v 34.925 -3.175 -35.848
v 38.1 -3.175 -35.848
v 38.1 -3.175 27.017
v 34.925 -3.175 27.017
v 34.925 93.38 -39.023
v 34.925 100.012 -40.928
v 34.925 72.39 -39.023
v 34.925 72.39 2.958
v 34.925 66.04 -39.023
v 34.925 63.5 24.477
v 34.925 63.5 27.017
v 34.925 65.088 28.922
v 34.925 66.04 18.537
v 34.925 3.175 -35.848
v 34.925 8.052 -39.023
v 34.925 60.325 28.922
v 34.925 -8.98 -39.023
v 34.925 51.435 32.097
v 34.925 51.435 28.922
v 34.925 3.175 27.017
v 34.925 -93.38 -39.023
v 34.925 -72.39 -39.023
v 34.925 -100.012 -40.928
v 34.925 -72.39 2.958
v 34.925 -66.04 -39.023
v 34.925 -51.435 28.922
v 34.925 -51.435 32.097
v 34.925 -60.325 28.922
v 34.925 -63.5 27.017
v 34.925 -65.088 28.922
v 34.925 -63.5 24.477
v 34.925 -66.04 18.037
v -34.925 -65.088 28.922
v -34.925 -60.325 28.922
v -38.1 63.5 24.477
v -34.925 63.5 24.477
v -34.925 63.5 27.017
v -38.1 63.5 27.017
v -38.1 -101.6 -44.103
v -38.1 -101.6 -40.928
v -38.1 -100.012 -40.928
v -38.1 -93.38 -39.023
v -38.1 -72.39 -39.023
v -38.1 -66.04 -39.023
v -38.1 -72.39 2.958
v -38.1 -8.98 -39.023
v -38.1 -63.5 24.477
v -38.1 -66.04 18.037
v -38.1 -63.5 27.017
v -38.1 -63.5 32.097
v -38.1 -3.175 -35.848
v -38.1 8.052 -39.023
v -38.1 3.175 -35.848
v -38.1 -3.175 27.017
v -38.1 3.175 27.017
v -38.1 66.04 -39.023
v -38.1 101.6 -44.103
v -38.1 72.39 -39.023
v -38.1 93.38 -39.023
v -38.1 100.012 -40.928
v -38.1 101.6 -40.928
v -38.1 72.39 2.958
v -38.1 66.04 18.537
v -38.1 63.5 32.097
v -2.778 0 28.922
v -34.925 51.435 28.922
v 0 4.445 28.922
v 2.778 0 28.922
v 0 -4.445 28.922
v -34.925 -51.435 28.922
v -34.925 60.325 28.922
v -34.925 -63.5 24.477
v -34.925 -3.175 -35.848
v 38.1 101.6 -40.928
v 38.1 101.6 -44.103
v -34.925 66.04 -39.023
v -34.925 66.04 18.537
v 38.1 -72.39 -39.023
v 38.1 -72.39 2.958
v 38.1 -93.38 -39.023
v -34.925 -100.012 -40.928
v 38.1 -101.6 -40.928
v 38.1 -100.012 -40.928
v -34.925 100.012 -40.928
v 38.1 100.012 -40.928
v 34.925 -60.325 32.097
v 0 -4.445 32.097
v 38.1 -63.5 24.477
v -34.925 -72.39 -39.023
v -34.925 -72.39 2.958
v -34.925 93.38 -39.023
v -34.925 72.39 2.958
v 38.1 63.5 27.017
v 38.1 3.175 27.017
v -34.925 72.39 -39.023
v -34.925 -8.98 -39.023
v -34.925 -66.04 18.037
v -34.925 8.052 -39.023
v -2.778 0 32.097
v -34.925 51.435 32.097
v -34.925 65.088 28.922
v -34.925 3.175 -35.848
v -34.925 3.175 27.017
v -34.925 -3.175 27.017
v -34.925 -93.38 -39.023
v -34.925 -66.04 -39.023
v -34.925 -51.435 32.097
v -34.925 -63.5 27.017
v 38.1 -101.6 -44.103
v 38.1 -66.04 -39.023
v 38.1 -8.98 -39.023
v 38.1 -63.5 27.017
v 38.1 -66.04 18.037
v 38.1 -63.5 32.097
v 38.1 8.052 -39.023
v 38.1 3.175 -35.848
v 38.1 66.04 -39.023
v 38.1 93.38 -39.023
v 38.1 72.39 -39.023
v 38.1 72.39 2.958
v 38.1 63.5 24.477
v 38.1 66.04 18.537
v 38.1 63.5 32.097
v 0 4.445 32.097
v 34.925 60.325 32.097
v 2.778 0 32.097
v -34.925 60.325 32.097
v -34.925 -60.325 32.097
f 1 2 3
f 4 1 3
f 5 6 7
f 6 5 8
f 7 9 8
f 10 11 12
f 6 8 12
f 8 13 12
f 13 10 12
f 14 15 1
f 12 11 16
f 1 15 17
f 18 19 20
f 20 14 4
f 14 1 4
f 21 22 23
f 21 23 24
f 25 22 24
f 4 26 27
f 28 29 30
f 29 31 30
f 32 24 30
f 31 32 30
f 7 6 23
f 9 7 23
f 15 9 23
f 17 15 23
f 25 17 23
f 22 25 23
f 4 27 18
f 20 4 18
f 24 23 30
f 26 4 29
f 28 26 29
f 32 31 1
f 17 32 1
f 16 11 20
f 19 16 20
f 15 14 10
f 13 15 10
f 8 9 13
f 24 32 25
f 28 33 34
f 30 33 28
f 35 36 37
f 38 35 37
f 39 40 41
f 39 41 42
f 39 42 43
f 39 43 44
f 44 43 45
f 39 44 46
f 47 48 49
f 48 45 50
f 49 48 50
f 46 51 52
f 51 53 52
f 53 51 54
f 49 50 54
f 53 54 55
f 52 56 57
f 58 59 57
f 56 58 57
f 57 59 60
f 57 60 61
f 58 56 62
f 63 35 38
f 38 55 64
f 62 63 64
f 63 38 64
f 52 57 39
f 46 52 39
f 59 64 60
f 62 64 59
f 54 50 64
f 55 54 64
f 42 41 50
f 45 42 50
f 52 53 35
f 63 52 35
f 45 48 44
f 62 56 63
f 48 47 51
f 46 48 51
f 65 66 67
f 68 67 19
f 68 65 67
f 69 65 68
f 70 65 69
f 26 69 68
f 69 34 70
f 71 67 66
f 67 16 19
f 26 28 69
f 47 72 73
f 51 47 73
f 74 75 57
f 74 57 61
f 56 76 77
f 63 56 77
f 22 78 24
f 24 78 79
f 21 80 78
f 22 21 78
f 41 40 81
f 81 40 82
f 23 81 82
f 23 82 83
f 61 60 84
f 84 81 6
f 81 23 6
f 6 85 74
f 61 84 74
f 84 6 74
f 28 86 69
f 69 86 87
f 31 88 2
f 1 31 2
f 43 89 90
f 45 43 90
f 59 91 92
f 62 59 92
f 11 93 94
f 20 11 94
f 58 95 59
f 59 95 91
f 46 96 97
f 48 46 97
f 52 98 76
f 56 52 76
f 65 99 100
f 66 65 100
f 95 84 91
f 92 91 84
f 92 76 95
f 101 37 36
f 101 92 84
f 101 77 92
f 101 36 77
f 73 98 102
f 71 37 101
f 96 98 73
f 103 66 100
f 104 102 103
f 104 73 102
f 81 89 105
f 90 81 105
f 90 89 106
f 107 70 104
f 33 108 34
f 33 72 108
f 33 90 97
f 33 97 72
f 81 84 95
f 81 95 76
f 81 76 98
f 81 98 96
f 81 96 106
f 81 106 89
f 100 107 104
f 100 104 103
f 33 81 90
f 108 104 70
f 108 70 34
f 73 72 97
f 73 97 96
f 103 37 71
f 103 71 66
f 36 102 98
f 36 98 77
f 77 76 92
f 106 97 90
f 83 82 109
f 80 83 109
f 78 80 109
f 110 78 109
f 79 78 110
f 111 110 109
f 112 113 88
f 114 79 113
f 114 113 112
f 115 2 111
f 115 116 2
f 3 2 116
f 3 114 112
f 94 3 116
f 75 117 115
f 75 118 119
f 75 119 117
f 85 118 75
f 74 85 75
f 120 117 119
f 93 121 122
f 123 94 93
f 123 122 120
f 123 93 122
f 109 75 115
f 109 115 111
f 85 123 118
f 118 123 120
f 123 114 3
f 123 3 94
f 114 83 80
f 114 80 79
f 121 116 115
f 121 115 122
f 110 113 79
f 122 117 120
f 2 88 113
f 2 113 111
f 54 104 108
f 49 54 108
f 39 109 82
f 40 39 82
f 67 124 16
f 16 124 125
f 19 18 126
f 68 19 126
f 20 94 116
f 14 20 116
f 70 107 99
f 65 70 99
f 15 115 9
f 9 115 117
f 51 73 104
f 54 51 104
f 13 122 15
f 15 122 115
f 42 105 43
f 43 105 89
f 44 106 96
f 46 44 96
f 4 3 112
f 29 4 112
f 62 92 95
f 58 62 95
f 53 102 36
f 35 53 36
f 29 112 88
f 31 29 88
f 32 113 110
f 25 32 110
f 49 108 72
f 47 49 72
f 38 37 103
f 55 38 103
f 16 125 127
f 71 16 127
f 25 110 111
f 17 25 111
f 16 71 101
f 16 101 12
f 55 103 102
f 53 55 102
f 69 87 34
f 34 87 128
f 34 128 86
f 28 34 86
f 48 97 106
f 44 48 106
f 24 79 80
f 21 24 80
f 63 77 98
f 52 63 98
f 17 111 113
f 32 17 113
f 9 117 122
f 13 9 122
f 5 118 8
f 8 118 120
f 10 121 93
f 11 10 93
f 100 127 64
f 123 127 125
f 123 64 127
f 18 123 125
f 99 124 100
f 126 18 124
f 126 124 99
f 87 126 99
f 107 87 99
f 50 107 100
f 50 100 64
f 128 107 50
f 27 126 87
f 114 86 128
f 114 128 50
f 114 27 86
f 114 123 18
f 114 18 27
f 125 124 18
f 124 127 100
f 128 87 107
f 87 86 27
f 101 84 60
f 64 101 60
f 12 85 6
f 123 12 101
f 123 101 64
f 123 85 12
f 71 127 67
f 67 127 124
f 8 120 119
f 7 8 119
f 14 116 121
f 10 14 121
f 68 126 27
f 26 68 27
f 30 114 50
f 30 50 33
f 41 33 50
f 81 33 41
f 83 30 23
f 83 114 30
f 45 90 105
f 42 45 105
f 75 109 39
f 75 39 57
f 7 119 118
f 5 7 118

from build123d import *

# Parameters (mm, degrees)
F1_DEPTH = 38.1
F2_W     = 69.85
F2_H     = 69.85
F3_DEPTH = 127
F5_DEPTH = 76.2
F7_DEPTH = 5.588
F8_W     = 5.08
F8_H     = 3.175
F9_DEPTH = 76.2


with BuildPart() as f1:
    # F0 (on Right) → F1 (new body, symmetric)
    with BuildSketch(Plane.YZ):
        Polygon((-63.5, 32.0970378816), (-101.6, -44.1029621184), (101.6, -44.1029621184), (63.5, 32.0970378816), align=None)
    extrude(amount=F1_DEPTH, both=True)

    # F2 (on Front) → F3 (cut, symmetric)
    with BuildSketch(Plane.XZ):
        with Locations((0, -6.0029621184)):
            Rectangle(F2_W, F2_H)
    extrude(amount=F3_DEPTH, both=True, mode=Mode.SUBTRACT)

    # F4 (on face) → F5 (cut)
    with BuildSketch(Plane.YZ.offset(38.1)):
        Polygon((-72.39, 2.9578125559), (-93.3803873372, -39.0229621184), (-72.39, -39.0229621184), align=None)
        Polygon((-66.04, 18.0367817605), (-66.04, -39.0229621184), (-8.9802561211, -39.0229621184), align=None)
        Polygon((-3.175, 27.0170378816), (-63.5, 27.0170378816), (-63.5, 24.4770378816), (-3.175, -35.8479621184), align=None)
        Polygon((63.5, 27.0170378816), (3.175, 27.0170378816), (3.175, -35.8479621184), (63.5, 24.4770378816), align=None)
        Polygon((66.04, 18.5374412686), (8.0518, -39.0229621184), (66.04, -39.0229621184), align=None)
        Polygon((72.39, -39.0229621184), (93.3803873372, -39.0229621184), (72.39, 2.9578125559), align=None)
    extrude(amount=-F5_DEPTH, mode=Mode.SUBTRACT)

    # F6 (on face) → F7 (cut)
    with BuildSketch(Plane.XY.offset(32.0970378816)):
        Polygon((-34.925, 51.435), (-34.925, -51.435), (-2.778125, 0), align=None)
        Polygon((0, 4.445), (34.925, 60.325), (-34.925, 60.325), align=None)
        Polygon((2.778125, 0), (34.925, -51.435), (34.925, 51.435), align=None)
        Polygon((-34.925, -60.325), (34.925, -60.325), (0, -4.445), align=None)
    extrude(amount=-F7_DEPTH, mode=Mode.SUBTRACT)

    # F8 (on face) → F9 (join)
    with BuildSketch(Plane.YZ.offset(38.1)):
        with Locations((-99.06, -42.5154621184)):
            Rectangle(F8_W, F8_H)
        with Locations((99.06, -42.5154621184)):
            Rectangle(F8_W, F8_H)
    extrude(amount=-F9_DEPTH)


solid = f1.part
